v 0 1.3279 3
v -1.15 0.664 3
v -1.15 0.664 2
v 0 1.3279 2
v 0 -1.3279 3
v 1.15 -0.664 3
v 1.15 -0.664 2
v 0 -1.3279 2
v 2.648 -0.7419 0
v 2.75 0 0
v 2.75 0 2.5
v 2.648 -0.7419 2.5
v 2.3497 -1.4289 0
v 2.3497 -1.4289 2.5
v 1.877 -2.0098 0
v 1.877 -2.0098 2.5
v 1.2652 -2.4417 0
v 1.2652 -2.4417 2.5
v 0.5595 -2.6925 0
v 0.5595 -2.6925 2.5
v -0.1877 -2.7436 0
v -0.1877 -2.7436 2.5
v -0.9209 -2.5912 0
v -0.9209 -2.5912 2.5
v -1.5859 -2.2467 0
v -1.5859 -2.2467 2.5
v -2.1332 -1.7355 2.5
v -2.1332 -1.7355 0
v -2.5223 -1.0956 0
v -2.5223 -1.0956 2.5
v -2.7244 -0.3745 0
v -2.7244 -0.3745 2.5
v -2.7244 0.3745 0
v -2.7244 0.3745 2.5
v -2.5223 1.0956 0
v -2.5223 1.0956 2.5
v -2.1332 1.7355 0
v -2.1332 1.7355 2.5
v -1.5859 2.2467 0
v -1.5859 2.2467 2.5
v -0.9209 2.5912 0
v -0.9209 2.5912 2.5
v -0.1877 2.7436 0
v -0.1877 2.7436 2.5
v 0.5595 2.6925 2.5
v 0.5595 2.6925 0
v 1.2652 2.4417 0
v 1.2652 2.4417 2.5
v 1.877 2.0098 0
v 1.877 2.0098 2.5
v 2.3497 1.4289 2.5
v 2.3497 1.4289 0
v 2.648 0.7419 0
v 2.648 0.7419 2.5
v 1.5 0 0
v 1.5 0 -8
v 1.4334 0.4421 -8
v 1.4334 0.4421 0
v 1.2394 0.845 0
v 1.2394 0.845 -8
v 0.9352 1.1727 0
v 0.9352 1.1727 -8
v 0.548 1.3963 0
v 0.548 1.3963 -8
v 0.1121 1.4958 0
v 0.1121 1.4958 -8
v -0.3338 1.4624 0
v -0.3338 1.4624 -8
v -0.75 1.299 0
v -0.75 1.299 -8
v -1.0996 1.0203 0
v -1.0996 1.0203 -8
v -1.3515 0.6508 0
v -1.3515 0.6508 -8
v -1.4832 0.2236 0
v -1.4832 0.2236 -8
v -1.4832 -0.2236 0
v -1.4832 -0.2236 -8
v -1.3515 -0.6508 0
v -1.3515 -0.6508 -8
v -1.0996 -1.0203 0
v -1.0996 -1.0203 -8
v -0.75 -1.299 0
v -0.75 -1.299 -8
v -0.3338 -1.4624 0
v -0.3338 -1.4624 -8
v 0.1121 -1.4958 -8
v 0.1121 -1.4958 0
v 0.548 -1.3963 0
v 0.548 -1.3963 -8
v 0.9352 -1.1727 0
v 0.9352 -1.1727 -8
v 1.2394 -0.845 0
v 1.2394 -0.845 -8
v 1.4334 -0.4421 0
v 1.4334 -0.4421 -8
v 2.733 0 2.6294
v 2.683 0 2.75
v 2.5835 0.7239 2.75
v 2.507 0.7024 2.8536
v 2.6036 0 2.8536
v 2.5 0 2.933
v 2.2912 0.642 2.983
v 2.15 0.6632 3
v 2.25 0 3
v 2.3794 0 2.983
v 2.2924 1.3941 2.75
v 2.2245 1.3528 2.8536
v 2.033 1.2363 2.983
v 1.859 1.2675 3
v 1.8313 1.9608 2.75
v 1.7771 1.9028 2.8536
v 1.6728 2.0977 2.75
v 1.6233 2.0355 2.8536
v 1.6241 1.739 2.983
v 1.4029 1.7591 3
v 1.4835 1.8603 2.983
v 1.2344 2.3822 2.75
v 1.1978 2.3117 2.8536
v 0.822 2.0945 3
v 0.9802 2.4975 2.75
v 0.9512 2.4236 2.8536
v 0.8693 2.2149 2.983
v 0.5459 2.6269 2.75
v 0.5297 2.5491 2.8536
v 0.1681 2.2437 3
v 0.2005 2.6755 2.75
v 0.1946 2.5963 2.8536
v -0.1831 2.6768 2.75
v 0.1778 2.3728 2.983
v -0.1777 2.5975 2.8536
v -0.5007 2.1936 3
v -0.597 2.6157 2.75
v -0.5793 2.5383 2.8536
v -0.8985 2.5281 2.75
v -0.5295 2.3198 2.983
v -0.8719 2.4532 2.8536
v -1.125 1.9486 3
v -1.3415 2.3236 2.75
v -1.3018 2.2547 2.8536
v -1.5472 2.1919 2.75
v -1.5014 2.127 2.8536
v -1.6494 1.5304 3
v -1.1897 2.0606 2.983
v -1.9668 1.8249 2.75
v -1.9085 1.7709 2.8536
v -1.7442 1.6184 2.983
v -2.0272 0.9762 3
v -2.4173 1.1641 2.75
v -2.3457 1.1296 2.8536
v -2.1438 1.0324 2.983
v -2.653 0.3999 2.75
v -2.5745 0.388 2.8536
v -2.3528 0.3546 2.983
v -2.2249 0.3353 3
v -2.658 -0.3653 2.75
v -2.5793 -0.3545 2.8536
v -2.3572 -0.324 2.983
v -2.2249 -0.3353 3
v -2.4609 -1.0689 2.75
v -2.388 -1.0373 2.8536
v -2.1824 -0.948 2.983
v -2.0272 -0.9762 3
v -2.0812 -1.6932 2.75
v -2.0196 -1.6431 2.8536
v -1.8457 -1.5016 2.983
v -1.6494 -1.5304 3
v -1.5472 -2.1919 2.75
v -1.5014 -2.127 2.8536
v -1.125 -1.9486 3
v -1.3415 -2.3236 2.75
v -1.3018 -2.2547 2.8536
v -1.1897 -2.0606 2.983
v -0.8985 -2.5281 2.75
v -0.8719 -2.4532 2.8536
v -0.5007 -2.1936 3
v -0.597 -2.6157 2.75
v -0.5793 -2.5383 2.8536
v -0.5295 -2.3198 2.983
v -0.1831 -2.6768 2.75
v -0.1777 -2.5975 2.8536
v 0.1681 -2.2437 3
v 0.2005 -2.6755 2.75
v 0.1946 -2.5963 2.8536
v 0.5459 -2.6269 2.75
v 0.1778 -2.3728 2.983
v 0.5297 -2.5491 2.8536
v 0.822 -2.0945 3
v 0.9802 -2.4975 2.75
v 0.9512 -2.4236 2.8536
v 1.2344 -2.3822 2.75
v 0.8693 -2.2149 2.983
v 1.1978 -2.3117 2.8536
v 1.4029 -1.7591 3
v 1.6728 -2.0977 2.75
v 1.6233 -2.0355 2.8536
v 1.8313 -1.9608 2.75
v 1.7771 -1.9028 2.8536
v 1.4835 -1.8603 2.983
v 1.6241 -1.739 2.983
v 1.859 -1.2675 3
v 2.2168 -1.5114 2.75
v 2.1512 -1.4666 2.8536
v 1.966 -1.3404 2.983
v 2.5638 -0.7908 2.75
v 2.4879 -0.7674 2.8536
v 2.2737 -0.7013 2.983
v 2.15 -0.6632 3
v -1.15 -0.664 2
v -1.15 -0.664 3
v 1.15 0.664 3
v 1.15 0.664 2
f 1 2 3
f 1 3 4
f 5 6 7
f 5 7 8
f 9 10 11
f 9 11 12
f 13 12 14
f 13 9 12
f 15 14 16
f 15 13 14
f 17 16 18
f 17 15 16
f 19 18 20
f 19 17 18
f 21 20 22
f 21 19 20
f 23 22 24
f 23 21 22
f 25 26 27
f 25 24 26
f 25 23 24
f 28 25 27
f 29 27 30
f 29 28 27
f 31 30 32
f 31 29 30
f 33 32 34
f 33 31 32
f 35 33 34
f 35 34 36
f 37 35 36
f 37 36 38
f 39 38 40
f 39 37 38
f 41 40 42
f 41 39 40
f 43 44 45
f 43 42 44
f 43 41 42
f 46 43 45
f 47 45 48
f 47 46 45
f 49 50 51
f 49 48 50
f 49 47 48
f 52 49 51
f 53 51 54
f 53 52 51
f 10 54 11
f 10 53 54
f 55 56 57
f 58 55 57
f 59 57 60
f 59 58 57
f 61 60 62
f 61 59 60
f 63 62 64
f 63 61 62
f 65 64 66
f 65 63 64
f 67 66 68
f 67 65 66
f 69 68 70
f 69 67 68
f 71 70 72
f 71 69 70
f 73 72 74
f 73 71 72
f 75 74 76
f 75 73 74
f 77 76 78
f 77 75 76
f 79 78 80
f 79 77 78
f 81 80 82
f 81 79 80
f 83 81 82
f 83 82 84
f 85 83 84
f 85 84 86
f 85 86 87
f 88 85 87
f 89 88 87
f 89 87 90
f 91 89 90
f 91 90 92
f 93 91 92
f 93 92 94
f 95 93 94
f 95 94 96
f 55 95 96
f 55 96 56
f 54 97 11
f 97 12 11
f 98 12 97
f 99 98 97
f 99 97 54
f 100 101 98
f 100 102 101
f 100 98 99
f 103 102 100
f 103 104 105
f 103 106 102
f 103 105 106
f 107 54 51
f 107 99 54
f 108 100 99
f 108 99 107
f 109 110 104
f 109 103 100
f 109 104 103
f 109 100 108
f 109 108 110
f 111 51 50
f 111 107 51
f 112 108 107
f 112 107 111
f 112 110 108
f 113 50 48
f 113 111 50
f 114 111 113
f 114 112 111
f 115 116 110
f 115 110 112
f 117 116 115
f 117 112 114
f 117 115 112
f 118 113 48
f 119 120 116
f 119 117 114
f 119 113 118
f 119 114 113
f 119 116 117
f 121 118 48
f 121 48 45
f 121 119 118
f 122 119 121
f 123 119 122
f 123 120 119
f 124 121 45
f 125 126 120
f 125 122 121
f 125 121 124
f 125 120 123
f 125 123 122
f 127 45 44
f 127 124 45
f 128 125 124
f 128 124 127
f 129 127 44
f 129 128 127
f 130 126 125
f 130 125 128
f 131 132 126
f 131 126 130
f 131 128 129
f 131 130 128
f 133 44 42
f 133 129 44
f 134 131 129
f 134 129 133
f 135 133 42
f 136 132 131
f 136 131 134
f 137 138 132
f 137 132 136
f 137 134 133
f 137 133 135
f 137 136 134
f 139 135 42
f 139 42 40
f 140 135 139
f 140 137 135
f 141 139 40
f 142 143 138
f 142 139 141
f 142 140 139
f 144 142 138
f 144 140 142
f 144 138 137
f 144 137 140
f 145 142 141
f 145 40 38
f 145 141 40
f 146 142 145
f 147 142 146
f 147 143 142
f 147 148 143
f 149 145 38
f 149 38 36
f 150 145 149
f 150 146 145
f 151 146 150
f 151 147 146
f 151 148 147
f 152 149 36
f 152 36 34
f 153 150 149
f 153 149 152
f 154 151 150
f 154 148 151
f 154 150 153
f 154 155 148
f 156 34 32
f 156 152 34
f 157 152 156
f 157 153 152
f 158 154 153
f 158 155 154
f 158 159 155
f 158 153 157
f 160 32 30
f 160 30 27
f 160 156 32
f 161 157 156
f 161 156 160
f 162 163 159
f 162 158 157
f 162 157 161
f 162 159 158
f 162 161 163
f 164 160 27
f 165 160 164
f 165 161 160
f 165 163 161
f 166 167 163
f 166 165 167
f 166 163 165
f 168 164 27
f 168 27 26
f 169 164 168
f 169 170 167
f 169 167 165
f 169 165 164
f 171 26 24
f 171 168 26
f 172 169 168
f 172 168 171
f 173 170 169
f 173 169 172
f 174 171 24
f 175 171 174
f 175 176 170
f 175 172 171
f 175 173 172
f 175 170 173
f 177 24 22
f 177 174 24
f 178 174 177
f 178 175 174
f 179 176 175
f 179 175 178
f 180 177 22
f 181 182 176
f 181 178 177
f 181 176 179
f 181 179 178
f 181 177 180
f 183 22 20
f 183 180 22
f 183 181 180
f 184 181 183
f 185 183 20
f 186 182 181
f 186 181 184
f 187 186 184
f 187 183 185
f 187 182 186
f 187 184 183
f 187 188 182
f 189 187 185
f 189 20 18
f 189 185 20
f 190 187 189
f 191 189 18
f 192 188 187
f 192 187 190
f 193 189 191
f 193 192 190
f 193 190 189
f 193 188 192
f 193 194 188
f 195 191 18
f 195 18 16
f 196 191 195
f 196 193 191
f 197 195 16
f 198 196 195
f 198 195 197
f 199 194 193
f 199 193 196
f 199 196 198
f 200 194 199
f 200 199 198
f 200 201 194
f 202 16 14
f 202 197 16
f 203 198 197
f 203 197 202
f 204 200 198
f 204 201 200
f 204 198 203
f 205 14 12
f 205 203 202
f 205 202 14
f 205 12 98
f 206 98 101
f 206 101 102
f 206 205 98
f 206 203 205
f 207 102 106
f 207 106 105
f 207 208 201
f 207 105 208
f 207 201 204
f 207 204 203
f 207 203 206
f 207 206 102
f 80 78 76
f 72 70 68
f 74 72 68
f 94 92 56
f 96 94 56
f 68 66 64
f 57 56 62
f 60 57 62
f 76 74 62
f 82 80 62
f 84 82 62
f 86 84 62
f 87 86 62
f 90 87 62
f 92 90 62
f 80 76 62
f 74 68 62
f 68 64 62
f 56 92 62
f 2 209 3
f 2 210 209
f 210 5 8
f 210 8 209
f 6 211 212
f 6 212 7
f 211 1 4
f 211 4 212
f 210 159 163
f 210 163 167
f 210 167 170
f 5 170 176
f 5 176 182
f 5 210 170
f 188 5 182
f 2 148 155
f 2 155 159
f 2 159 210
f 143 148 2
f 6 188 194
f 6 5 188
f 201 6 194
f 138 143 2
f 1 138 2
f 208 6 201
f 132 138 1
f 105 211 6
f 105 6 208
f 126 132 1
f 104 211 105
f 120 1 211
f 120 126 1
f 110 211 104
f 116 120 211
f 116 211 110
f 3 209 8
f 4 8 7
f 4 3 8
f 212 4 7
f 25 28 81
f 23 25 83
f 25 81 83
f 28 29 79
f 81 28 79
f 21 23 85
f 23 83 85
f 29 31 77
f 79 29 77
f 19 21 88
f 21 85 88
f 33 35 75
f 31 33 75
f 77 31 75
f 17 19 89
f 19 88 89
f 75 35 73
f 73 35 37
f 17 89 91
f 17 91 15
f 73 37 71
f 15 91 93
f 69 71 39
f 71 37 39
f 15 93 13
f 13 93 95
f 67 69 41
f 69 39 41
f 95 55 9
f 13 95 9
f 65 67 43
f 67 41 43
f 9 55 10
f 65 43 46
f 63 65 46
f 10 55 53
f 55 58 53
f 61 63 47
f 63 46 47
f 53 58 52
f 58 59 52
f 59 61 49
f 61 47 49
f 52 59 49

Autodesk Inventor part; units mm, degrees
ref_plane "YZ Plane" through (0, 0, 0) normal (1, 0, 0) x (0, 1, 0)
ref_plane "XZ Plane" through (0, 0, 0) normal (0, 1, 0) x (-1, 0, 0)
ref_plane "XY Plane" through (0, 0, 0) normal (0, 0, 1) x (1, 0, 0)
sketch "Sketch3" plane through (0, 0, 0) normal (0, 0, 1) x (1, 0, 0)
  circle A0 centre (0, 0) radius 2.75
  circle A1 centre (0, 0) radius 1.5
  line L0 (1.15, -0.664) -> (0, -1.3279)
  line L1 (0, -1.3279) -> (-1.15, -0.664)
  line L2 (-1.15, -0.664) -> (-1.15, 0.664)
  line L3 (-1.15, 0.664) -> (0, 1.3279)
  line L4 (0, 1.3279) -> (1.15, 0.664)
  line L5 (1.15, 0.664) -> (1.15, -0.664)
  point P0 (1.15, 0)
  dimension "d8" = 1.5
  dimension "d9" = 2.75
  dimension "d10" = 2.3
extrude "Extrusion1" add sketch "Sketch3" along normal blind 3 contours A0 | A1 | L0 L1 L2 L3 L4 L5
extrude "Extrusion2" add sketch "Sketch3" against normal blind 8 contours A1 | L0 L1 L2 L3 L4 L5
extrude "Extrusion3" cut sketch "Sketch3" against normal blind 1 from surface at 3 contours L0 L1 L2 L3 L4 L5
fillet "Fillet1" radius 0.5 1 edges at (-2.75, 0, 3)
thread "Thread2" size "M3x0.5" class "6g" standard "ISO Metric profile" full length
properties part number "MachineScrew_Template"
